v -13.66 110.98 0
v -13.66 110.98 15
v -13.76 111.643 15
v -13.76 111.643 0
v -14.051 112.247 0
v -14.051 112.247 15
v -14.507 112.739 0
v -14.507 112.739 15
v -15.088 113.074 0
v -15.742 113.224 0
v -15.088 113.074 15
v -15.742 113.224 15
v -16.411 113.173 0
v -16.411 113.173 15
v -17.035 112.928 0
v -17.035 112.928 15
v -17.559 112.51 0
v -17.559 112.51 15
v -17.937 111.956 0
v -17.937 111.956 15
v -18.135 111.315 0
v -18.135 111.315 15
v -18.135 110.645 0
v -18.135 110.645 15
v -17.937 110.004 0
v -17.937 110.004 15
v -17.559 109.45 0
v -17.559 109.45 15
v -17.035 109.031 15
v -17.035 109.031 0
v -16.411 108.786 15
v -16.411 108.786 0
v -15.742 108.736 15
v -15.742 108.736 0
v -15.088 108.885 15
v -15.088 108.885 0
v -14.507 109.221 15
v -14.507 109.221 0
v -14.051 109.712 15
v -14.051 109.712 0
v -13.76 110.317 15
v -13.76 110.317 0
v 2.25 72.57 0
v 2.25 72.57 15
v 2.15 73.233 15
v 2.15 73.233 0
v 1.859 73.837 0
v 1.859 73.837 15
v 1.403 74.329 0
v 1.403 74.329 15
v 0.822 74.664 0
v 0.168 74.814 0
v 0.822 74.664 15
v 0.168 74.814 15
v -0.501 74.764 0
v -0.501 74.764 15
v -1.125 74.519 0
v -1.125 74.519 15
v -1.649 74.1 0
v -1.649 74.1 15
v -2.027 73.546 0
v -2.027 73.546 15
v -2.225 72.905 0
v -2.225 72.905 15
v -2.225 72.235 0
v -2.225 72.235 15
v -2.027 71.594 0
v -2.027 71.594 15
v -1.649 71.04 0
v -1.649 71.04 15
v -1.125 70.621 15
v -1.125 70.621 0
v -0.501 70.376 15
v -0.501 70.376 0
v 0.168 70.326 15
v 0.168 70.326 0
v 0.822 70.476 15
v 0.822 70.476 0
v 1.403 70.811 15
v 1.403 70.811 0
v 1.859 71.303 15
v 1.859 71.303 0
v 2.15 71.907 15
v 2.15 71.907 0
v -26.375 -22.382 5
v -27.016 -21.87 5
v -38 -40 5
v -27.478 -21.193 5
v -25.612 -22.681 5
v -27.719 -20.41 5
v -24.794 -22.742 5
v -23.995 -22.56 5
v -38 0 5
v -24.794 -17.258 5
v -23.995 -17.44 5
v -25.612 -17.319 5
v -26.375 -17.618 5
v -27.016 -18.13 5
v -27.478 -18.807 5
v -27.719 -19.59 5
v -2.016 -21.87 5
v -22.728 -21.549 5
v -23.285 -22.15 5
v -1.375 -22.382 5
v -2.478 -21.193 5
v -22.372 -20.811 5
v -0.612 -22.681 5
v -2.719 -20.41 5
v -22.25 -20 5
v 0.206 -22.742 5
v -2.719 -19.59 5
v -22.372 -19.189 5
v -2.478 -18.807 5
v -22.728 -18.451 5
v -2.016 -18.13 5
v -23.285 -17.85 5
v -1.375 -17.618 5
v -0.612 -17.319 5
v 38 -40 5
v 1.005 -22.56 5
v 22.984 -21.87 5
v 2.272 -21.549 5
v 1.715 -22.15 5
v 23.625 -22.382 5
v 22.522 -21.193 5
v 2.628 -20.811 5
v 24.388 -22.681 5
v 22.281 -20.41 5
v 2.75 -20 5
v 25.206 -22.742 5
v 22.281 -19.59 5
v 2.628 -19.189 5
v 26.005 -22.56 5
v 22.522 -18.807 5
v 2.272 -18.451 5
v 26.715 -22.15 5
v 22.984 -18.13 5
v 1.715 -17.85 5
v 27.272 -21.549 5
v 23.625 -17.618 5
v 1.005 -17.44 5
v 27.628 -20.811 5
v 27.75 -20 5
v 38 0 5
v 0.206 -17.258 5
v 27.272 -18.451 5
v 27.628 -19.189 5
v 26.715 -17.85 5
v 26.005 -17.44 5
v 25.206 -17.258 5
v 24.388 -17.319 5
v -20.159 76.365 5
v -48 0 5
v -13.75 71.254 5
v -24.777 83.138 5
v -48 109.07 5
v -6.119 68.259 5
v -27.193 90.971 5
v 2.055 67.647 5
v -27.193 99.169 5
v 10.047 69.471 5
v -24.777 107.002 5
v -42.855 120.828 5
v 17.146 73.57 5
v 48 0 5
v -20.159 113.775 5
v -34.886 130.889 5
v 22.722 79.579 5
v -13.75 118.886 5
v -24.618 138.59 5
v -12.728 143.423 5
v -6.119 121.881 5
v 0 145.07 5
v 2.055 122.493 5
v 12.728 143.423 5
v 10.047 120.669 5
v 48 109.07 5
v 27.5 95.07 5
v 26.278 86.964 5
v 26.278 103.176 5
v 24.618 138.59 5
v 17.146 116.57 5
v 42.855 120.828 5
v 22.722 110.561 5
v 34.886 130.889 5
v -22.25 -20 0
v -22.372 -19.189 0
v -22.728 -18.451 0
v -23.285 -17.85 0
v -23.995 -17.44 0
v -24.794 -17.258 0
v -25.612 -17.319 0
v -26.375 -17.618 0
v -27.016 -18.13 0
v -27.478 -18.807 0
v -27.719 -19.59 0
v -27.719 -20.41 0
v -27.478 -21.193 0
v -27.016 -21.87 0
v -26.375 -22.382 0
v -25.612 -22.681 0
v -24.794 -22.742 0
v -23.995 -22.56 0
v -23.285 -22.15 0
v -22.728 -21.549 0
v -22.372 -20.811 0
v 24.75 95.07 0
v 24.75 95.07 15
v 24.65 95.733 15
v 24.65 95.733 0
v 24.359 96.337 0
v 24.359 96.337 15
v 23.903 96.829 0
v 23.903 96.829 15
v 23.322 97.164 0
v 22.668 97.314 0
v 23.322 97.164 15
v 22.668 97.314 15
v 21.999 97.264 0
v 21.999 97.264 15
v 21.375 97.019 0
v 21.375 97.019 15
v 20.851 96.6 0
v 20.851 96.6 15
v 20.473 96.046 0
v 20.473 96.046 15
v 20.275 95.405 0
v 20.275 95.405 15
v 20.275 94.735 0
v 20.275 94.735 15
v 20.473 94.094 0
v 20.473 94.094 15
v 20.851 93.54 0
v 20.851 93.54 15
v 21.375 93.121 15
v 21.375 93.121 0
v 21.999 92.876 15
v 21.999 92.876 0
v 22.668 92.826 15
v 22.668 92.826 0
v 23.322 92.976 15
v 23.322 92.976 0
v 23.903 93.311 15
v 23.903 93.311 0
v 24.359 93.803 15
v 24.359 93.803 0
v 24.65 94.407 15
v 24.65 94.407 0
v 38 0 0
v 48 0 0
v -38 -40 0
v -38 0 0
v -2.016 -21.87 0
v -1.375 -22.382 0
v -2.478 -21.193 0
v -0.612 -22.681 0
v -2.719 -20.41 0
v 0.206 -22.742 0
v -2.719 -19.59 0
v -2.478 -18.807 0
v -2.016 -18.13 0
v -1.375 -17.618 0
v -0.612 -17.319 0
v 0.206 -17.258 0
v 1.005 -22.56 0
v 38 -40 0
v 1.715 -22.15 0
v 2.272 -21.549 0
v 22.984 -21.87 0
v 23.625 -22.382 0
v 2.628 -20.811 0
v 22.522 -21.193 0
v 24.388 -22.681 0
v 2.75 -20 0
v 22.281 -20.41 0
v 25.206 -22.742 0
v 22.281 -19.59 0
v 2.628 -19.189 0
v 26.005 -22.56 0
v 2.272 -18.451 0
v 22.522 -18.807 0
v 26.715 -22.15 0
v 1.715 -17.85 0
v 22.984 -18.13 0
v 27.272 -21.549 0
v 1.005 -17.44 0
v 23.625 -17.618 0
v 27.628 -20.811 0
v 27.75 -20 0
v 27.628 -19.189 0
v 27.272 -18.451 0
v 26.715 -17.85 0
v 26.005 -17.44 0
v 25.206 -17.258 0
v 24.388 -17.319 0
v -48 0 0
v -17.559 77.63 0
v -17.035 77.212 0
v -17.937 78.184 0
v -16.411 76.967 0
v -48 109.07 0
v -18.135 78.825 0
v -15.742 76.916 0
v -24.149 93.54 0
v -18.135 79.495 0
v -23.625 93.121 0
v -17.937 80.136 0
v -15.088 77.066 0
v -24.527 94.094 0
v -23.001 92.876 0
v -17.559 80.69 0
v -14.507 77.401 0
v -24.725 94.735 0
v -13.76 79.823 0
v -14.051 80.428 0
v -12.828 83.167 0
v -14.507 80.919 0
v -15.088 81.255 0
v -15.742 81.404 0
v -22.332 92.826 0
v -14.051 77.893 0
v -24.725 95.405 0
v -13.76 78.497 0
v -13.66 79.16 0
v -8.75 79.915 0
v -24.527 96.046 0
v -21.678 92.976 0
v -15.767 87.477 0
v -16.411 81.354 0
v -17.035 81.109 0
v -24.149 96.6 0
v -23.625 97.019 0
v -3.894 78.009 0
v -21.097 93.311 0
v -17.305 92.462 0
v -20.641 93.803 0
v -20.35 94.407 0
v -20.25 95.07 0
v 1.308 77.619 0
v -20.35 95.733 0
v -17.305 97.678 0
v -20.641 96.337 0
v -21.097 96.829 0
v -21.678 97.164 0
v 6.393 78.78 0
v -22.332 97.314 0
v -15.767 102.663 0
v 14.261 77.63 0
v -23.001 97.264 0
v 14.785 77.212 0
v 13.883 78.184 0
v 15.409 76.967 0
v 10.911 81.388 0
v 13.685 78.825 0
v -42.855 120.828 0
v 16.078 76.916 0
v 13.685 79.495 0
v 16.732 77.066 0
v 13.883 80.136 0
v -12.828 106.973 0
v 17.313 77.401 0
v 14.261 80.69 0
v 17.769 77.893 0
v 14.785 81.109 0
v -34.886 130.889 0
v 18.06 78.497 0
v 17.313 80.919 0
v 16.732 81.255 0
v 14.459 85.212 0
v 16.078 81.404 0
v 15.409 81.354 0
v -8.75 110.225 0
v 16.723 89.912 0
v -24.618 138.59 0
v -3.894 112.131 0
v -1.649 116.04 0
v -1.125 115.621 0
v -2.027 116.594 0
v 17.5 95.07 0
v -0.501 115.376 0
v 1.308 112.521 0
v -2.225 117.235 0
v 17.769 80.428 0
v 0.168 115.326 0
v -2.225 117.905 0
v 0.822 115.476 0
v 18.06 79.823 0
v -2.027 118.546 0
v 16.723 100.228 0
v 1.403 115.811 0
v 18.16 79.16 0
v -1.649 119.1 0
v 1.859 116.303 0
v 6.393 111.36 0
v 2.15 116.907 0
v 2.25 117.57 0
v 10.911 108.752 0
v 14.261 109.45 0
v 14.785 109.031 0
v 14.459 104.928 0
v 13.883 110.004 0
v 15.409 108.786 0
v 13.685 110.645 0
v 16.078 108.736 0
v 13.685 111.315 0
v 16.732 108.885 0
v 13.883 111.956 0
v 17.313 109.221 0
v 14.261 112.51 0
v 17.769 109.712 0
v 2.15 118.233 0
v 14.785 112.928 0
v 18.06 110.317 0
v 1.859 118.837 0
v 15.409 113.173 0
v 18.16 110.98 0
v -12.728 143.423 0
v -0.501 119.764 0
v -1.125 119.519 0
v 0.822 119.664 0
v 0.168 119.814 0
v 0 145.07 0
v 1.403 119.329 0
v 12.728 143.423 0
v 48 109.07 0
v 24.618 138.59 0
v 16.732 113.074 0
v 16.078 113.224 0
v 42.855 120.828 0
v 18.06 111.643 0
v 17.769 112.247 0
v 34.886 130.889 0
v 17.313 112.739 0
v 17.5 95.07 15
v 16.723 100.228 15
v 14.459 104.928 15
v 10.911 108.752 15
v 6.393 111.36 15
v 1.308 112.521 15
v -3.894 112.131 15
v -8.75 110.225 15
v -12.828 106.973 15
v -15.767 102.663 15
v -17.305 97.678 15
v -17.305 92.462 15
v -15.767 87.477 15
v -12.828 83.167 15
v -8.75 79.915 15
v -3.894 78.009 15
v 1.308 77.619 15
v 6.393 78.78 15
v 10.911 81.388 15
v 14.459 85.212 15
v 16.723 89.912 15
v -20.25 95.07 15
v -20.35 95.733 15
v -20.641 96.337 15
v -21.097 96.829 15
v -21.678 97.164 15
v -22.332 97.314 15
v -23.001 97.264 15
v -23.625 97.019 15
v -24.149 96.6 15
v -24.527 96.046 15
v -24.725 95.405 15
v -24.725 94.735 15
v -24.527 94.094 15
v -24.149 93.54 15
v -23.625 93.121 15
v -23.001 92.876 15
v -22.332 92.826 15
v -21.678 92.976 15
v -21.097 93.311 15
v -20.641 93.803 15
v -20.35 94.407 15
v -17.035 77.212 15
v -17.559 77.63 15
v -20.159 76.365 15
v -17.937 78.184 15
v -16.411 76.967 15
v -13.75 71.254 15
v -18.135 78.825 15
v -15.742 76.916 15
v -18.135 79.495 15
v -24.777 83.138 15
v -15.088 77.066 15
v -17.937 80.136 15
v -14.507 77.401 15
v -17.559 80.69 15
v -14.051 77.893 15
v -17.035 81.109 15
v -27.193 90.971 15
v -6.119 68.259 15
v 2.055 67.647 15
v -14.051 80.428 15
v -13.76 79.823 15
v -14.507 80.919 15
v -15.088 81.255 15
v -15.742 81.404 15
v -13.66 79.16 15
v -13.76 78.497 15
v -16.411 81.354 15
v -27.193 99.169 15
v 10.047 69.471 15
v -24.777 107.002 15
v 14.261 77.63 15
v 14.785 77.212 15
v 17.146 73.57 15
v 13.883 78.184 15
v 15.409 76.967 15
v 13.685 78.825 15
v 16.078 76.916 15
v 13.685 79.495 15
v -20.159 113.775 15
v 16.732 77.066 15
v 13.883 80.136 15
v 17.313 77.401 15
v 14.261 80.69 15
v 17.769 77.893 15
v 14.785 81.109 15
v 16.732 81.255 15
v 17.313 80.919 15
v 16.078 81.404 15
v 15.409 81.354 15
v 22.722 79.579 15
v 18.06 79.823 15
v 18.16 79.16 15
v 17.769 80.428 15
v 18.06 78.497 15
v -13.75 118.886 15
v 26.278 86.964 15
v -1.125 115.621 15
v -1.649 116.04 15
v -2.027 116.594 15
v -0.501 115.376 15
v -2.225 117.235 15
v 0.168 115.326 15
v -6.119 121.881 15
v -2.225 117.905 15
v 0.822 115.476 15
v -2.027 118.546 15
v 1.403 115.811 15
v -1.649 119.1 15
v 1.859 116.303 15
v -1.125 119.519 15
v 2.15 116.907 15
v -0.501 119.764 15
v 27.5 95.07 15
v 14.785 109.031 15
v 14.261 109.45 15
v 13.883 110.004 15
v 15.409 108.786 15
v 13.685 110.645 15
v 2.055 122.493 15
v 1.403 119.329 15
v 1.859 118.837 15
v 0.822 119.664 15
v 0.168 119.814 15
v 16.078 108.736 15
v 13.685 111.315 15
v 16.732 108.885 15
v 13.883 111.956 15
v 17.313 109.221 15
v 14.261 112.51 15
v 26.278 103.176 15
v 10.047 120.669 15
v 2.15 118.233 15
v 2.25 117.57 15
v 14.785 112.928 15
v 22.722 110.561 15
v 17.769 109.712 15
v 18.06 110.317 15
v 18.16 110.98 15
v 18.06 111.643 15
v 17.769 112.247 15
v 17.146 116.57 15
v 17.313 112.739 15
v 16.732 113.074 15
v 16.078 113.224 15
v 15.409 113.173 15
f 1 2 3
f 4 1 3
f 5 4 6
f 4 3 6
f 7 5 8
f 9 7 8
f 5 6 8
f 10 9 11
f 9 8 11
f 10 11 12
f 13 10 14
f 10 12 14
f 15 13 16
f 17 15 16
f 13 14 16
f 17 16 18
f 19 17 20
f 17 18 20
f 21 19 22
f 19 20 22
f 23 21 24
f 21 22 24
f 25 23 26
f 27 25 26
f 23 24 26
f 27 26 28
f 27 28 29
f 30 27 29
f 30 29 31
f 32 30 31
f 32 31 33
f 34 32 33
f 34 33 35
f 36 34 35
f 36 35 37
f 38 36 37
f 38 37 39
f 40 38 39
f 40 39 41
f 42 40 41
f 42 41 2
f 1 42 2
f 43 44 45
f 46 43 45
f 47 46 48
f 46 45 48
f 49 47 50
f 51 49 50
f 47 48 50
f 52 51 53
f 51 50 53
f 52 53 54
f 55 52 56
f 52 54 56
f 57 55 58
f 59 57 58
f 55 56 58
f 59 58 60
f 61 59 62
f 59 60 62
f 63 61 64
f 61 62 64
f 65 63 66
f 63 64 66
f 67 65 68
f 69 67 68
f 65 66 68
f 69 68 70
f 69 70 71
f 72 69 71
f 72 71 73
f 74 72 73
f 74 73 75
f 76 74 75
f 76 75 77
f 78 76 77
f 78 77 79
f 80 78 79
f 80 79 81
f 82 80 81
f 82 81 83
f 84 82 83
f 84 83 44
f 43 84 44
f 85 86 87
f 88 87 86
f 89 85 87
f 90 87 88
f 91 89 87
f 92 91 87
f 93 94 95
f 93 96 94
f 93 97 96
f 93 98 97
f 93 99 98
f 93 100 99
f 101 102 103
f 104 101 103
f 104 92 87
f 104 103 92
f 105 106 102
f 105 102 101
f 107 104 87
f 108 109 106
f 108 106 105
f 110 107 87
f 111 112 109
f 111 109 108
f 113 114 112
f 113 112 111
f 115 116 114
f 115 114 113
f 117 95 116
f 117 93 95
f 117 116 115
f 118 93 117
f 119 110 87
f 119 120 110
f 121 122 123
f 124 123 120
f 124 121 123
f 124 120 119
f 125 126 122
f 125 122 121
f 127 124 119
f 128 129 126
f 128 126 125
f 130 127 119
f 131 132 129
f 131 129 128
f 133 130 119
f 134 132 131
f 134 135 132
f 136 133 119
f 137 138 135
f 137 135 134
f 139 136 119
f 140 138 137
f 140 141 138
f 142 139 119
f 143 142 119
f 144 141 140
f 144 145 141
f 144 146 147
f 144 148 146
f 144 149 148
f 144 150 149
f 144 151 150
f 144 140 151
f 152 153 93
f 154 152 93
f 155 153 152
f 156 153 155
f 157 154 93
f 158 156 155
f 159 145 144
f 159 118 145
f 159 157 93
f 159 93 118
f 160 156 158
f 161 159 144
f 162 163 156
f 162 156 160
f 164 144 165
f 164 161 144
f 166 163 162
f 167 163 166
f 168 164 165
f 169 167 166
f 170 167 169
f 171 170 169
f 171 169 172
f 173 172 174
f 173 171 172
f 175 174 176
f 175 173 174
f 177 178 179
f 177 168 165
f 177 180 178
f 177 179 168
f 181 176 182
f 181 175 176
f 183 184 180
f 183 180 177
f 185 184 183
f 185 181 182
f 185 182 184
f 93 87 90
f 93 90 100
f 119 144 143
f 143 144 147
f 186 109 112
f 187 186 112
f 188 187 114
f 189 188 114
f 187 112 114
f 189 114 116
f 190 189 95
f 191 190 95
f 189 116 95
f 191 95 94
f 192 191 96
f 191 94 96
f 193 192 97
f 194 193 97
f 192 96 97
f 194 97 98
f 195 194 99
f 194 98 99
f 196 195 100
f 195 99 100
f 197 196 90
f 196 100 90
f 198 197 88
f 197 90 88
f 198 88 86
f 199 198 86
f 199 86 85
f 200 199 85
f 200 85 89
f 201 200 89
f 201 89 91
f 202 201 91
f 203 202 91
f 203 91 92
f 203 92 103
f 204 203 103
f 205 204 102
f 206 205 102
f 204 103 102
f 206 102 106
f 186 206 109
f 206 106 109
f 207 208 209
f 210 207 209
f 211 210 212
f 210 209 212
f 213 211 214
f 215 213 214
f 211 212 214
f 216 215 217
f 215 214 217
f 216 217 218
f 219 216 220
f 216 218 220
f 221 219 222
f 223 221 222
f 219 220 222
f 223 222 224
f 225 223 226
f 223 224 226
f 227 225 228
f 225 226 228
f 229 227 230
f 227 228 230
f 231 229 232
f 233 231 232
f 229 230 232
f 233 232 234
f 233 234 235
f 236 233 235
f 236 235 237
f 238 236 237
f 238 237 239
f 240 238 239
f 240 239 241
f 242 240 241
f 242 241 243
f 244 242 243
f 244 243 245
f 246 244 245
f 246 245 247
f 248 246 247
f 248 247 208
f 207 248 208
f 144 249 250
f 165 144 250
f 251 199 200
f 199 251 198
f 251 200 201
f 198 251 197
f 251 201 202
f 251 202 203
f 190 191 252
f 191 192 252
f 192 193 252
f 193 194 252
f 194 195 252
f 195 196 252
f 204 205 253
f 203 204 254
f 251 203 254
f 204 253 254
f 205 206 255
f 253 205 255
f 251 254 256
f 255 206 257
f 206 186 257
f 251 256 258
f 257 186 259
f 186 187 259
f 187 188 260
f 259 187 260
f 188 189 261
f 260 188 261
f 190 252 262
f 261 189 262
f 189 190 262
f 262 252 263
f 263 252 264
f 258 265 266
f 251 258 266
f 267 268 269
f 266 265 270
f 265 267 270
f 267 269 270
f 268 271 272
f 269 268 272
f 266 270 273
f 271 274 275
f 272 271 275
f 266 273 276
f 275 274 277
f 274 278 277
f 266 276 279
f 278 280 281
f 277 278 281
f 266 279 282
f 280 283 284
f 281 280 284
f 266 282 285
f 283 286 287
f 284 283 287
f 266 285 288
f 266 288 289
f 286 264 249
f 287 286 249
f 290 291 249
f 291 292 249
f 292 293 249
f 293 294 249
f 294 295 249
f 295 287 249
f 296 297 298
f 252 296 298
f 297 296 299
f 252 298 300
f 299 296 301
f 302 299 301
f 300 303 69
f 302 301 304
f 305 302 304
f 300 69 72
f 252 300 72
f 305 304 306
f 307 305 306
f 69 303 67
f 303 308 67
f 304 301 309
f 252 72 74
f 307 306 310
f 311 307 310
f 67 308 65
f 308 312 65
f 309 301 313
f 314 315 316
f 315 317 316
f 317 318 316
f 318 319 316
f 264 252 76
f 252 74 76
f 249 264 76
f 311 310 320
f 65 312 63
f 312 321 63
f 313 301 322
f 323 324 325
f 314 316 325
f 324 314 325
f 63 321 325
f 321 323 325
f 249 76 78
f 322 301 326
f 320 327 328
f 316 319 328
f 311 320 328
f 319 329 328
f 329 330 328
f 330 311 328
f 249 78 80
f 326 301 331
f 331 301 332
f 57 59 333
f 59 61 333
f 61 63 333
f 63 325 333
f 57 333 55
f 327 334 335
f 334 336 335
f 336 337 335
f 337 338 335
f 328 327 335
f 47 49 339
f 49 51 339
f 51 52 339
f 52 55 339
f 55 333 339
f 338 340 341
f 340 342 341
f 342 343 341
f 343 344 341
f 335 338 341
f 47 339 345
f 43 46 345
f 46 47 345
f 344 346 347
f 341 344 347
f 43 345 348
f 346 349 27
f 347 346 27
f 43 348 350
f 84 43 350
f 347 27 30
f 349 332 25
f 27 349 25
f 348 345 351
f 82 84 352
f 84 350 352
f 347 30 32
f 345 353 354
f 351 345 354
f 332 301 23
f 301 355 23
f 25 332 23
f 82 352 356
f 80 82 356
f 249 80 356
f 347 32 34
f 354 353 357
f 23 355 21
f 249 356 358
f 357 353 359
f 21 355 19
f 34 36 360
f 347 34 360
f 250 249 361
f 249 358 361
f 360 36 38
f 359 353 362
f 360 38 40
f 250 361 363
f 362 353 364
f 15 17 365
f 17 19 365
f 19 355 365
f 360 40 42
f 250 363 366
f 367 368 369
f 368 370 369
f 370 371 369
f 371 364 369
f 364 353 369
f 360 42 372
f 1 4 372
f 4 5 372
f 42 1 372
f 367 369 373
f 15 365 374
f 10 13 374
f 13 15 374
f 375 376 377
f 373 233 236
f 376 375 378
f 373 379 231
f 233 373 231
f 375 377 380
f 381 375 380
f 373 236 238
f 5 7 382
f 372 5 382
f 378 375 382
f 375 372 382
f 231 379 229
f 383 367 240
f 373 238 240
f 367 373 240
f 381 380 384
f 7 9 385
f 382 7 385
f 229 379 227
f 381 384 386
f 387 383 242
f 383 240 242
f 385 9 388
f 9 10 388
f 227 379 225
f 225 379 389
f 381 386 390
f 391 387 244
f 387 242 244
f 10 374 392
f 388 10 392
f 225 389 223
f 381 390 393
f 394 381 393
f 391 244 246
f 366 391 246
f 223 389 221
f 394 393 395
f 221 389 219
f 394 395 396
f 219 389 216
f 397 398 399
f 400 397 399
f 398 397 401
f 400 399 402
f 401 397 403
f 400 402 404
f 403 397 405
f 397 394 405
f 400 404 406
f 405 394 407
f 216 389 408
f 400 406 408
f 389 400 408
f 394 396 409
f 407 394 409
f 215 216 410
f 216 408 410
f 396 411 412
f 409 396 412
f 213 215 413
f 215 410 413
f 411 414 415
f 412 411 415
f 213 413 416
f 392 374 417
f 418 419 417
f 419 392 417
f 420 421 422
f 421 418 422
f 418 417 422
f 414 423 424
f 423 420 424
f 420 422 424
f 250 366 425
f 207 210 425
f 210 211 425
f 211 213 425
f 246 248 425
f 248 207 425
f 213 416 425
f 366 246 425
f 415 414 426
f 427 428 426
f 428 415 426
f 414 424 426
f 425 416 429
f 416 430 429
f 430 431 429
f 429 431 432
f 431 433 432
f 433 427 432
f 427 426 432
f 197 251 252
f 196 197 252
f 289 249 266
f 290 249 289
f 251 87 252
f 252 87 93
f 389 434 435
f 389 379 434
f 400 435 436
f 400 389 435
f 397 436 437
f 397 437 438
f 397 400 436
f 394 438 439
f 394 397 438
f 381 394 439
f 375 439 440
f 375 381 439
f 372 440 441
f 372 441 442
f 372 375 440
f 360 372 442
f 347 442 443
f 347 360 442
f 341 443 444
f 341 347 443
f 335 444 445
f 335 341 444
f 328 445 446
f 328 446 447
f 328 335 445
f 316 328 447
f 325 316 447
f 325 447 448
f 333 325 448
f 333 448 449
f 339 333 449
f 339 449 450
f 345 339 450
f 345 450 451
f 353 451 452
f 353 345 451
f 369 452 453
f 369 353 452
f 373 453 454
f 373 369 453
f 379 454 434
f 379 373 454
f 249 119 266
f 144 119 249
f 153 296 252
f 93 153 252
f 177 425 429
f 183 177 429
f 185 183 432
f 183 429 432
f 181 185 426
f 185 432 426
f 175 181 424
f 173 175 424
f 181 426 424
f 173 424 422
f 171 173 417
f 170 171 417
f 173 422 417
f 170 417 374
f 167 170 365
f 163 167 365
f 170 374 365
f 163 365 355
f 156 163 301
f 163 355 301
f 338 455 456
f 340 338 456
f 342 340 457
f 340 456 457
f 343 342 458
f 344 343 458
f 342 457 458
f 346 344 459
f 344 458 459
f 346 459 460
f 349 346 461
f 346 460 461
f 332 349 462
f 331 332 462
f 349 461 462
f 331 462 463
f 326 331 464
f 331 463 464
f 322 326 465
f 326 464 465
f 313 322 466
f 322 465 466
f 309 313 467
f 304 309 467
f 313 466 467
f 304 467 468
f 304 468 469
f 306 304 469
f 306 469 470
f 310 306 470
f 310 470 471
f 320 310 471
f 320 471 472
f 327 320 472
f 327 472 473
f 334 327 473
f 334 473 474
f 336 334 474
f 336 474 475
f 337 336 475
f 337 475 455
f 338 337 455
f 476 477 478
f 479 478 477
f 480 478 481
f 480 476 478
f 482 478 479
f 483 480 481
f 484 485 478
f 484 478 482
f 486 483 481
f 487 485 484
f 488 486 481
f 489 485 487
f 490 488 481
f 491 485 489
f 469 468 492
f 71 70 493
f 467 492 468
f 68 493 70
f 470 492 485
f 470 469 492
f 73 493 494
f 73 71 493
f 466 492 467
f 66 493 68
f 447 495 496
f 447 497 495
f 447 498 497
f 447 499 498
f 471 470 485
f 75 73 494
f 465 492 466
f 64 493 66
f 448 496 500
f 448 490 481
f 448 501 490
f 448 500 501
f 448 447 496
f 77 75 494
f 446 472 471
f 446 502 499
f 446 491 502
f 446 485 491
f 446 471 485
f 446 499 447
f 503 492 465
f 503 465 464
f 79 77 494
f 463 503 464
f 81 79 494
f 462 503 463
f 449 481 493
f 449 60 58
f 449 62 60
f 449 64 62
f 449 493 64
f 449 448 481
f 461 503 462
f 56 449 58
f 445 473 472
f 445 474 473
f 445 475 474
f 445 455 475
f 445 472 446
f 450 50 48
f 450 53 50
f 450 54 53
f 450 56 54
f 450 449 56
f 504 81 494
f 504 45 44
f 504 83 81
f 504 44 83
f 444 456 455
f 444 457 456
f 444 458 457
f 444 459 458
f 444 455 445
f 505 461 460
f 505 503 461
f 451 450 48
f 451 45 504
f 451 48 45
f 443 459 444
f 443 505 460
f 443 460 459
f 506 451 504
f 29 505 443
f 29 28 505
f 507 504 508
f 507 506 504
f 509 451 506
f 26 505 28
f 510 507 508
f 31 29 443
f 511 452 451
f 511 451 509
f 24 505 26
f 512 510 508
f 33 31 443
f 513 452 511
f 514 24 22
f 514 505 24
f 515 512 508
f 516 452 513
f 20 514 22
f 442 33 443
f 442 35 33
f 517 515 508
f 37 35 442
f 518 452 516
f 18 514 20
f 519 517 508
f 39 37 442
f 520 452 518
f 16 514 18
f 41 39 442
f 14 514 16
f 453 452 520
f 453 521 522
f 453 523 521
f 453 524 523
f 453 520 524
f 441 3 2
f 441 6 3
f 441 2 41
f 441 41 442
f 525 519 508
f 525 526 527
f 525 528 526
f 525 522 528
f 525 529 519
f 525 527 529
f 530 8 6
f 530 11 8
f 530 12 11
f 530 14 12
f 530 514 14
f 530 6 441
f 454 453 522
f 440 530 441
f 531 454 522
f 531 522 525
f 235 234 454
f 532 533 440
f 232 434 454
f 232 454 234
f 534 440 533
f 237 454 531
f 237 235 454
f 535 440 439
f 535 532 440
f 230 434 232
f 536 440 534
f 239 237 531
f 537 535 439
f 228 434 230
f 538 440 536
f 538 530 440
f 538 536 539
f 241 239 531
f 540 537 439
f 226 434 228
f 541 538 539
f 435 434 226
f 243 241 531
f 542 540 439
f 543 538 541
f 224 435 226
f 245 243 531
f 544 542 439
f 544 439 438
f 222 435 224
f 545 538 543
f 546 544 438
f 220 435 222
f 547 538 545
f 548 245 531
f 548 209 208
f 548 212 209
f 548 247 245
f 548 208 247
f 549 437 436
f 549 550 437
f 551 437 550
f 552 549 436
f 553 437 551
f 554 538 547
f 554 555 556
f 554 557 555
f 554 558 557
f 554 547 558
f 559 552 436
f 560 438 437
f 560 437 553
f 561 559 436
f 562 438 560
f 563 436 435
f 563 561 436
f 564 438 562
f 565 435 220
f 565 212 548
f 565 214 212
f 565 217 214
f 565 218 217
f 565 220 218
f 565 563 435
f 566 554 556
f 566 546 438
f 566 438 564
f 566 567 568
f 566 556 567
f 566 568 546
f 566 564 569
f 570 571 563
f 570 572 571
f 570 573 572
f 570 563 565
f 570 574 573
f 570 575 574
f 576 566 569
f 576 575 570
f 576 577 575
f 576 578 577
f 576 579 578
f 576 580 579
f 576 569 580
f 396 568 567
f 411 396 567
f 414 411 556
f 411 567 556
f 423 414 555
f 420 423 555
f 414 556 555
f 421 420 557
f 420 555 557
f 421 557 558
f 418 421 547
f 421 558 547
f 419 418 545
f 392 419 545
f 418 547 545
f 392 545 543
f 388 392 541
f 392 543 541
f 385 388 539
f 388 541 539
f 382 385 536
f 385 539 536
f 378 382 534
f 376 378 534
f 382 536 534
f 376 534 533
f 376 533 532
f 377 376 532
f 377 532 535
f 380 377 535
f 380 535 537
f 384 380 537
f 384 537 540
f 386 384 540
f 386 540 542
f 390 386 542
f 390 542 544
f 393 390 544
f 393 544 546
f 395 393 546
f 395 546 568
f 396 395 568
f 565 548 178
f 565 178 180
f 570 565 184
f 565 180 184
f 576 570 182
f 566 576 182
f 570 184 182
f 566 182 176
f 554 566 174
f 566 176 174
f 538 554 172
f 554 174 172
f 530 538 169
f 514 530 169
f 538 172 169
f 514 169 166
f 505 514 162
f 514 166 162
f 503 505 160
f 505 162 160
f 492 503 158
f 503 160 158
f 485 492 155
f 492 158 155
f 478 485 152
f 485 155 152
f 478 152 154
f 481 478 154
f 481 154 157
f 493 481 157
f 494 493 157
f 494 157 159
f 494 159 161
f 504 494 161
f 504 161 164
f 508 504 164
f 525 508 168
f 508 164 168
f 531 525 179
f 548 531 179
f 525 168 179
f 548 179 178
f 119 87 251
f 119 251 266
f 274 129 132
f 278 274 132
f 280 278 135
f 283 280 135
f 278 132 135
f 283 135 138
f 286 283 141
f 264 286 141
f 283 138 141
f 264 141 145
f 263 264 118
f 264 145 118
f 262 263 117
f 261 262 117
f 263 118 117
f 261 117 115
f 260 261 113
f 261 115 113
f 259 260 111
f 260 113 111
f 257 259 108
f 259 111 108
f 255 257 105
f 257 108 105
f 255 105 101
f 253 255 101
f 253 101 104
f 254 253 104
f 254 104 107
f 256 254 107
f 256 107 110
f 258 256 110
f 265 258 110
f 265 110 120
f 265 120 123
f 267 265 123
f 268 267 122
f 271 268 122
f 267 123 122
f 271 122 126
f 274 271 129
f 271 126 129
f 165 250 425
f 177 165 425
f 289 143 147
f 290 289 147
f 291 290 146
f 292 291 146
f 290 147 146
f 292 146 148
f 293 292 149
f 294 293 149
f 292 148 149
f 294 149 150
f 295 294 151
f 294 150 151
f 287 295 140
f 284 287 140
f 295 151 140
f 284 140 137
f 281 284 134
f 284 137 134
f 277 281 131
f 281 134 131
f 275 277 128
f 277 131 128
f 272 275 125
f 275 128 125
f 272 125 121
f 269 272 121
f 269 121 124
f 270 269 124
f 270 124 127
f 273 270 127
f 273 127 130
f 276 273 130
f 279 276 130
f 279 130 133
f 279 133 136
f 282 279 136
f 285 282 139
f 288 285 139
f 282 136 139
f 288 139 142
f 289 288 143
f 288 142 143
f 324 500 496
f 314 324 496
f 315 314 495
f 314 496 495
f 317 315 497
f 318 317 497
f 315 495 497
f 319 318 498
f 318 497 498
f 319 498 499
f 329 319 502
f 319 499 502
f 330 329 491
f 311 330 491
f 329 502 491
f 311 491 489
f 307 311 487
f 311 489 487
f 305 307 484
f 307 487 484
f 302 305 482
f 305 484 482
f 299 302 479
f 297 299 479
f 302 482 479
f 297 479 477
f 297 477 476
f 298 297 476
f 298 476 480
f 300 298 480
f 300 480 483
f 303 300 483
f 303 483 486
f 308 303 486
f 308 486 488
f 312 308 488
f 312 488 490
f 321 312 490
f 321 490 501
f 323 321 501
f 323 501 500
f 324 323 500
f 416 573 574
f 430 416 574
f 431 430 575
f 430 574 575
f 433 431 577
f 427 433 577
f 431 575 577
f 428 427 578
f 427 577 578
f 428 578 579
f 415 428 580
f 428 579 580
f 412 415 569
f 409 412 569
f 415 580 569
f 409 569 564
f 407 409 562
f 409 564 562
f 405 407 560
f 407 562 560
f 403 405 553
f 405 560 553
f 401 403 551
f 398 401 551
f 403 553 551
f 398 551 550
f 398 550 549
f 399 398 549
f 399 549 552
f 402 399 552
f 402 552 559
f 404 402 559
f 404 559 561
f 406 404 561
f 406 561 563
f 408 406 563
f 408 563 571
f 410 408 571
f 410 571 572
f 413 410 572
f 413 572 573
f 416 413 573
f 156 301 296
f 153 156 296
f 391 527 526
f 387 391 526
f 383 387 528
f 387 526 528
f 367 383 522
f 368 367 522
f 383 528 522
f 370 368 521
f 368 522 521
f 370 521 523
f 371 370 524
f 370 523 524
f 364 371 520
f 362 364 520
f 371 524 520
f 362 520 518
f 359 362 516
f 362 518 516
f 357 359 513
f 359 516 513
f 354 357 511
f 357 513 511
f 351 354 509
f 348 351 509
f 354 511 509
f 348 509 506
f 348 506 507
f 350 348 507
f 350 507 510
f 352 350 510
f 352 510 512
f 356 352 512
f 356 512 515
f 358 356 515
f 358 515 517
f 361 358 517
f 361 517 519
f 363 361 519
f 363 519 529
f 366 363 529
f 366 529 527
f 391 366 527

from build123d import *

# Parameters (mm, degrees)
SKETCH_1_R          = 17.5
EXTRUDE_1_DEPTH     = 5
SKETCH_10_W         = 76
SKETCH_10_H         = 40
SKETCH_10_R         = 2.75
EXTRUDE_2_DEPTH     = 5
SKETCH_11_R         = 27.5
SKETCH_11_R_2       = 17.5
EXTRUDE_3_DEPTH     = 10
SKETCH_12_R         = 2.25
CUT_EXTRUDE_6_DEPTH = 40


with BuildPart() as part:
    # 草图1 → 凸台-拉伸1 (new body)
    with BuildSketch(Plane.XY):
        with BuildLine():
            Line((-48, 109.07), (-48, 0))
            Line((-48, 0), (48, 0))
            Line((48, 0), (48, 109.07))
            ThreePointArc((48, 109.07), (0, 145.07), (-48, 109.07))
        make_face()
        with Locations((0, 95.07)):
            Circle(SKETCH_1_R, mode=Mode.SUBTRACT)
    extrude(amount=EXTRUDE_1_DEPTH)

    # 草图10 → 凸台-拉伸2 (add)
    with BuildSketch(Plane.XY.offset(5)):
        with Locations((0, -20)):
            Rectangle(SKETCH_10_W, SKETCH_10_H)
        with Locations((25, -20)):
            Circle(SKETCH_10_R, mode=Mode.SUBTRACT)
        with Locations((-25, -20)):
            Circle(SKETCH_10_R, mode=Mode.SUBTRACT)
        with Locations((0, -20)):
            Circle(SKETCH_10_R, mode=Mode.SUBTRACT)
    extrude(amount=-EXTRUDE_2_DEPTH)

    # 草图11 → 凸台-拉伸3 (add)
    with BuildSketch(Plane.XY.offset(5)):
        with Locations((0, 95.07)):
            Circle(SKETCH_11_R)
        with Locations((0, 95.07)):
            Circle(SKETCH_11_R_2, mode=Mode.SUBTRACT)
    extrude(amount=EXTRUDE_3_DEPTH)

    # 草图12 → 切除-拉伸6 (cut)
    with BuildSketch(Plane.XY.offset(15)):
        with Locations((0, 117.57)):
            Circle(SKETCH_12_R)
        with Locations((15.909902577, 110.979902577)):
            Circle(SKETCH_12_R)
        with Locations((22.5, 95.07)):
            Circle(SKETCH_12_R)
        with Locations((15.909902577, 79.160097423)):
            Circle(SKETCH_12_R)
        with Locations((0, 72.57)):
            Circle(SKETCH_12_R)
        with Locations((-15.909902577, 79.160097423)):
            Circle(SKETCH_12_R)
        with Locations((-22.5, 95.07)):
            Circle(SKETCH_12_R)
        with Locations((-15.909902577, 110.979902577)):
            Circle(SKETCH_12_R)
    extrude(amount=-CUT_EXTRUDE_6_DEPTH, mode=Mode.SUBTRACT)


solid = part.part
